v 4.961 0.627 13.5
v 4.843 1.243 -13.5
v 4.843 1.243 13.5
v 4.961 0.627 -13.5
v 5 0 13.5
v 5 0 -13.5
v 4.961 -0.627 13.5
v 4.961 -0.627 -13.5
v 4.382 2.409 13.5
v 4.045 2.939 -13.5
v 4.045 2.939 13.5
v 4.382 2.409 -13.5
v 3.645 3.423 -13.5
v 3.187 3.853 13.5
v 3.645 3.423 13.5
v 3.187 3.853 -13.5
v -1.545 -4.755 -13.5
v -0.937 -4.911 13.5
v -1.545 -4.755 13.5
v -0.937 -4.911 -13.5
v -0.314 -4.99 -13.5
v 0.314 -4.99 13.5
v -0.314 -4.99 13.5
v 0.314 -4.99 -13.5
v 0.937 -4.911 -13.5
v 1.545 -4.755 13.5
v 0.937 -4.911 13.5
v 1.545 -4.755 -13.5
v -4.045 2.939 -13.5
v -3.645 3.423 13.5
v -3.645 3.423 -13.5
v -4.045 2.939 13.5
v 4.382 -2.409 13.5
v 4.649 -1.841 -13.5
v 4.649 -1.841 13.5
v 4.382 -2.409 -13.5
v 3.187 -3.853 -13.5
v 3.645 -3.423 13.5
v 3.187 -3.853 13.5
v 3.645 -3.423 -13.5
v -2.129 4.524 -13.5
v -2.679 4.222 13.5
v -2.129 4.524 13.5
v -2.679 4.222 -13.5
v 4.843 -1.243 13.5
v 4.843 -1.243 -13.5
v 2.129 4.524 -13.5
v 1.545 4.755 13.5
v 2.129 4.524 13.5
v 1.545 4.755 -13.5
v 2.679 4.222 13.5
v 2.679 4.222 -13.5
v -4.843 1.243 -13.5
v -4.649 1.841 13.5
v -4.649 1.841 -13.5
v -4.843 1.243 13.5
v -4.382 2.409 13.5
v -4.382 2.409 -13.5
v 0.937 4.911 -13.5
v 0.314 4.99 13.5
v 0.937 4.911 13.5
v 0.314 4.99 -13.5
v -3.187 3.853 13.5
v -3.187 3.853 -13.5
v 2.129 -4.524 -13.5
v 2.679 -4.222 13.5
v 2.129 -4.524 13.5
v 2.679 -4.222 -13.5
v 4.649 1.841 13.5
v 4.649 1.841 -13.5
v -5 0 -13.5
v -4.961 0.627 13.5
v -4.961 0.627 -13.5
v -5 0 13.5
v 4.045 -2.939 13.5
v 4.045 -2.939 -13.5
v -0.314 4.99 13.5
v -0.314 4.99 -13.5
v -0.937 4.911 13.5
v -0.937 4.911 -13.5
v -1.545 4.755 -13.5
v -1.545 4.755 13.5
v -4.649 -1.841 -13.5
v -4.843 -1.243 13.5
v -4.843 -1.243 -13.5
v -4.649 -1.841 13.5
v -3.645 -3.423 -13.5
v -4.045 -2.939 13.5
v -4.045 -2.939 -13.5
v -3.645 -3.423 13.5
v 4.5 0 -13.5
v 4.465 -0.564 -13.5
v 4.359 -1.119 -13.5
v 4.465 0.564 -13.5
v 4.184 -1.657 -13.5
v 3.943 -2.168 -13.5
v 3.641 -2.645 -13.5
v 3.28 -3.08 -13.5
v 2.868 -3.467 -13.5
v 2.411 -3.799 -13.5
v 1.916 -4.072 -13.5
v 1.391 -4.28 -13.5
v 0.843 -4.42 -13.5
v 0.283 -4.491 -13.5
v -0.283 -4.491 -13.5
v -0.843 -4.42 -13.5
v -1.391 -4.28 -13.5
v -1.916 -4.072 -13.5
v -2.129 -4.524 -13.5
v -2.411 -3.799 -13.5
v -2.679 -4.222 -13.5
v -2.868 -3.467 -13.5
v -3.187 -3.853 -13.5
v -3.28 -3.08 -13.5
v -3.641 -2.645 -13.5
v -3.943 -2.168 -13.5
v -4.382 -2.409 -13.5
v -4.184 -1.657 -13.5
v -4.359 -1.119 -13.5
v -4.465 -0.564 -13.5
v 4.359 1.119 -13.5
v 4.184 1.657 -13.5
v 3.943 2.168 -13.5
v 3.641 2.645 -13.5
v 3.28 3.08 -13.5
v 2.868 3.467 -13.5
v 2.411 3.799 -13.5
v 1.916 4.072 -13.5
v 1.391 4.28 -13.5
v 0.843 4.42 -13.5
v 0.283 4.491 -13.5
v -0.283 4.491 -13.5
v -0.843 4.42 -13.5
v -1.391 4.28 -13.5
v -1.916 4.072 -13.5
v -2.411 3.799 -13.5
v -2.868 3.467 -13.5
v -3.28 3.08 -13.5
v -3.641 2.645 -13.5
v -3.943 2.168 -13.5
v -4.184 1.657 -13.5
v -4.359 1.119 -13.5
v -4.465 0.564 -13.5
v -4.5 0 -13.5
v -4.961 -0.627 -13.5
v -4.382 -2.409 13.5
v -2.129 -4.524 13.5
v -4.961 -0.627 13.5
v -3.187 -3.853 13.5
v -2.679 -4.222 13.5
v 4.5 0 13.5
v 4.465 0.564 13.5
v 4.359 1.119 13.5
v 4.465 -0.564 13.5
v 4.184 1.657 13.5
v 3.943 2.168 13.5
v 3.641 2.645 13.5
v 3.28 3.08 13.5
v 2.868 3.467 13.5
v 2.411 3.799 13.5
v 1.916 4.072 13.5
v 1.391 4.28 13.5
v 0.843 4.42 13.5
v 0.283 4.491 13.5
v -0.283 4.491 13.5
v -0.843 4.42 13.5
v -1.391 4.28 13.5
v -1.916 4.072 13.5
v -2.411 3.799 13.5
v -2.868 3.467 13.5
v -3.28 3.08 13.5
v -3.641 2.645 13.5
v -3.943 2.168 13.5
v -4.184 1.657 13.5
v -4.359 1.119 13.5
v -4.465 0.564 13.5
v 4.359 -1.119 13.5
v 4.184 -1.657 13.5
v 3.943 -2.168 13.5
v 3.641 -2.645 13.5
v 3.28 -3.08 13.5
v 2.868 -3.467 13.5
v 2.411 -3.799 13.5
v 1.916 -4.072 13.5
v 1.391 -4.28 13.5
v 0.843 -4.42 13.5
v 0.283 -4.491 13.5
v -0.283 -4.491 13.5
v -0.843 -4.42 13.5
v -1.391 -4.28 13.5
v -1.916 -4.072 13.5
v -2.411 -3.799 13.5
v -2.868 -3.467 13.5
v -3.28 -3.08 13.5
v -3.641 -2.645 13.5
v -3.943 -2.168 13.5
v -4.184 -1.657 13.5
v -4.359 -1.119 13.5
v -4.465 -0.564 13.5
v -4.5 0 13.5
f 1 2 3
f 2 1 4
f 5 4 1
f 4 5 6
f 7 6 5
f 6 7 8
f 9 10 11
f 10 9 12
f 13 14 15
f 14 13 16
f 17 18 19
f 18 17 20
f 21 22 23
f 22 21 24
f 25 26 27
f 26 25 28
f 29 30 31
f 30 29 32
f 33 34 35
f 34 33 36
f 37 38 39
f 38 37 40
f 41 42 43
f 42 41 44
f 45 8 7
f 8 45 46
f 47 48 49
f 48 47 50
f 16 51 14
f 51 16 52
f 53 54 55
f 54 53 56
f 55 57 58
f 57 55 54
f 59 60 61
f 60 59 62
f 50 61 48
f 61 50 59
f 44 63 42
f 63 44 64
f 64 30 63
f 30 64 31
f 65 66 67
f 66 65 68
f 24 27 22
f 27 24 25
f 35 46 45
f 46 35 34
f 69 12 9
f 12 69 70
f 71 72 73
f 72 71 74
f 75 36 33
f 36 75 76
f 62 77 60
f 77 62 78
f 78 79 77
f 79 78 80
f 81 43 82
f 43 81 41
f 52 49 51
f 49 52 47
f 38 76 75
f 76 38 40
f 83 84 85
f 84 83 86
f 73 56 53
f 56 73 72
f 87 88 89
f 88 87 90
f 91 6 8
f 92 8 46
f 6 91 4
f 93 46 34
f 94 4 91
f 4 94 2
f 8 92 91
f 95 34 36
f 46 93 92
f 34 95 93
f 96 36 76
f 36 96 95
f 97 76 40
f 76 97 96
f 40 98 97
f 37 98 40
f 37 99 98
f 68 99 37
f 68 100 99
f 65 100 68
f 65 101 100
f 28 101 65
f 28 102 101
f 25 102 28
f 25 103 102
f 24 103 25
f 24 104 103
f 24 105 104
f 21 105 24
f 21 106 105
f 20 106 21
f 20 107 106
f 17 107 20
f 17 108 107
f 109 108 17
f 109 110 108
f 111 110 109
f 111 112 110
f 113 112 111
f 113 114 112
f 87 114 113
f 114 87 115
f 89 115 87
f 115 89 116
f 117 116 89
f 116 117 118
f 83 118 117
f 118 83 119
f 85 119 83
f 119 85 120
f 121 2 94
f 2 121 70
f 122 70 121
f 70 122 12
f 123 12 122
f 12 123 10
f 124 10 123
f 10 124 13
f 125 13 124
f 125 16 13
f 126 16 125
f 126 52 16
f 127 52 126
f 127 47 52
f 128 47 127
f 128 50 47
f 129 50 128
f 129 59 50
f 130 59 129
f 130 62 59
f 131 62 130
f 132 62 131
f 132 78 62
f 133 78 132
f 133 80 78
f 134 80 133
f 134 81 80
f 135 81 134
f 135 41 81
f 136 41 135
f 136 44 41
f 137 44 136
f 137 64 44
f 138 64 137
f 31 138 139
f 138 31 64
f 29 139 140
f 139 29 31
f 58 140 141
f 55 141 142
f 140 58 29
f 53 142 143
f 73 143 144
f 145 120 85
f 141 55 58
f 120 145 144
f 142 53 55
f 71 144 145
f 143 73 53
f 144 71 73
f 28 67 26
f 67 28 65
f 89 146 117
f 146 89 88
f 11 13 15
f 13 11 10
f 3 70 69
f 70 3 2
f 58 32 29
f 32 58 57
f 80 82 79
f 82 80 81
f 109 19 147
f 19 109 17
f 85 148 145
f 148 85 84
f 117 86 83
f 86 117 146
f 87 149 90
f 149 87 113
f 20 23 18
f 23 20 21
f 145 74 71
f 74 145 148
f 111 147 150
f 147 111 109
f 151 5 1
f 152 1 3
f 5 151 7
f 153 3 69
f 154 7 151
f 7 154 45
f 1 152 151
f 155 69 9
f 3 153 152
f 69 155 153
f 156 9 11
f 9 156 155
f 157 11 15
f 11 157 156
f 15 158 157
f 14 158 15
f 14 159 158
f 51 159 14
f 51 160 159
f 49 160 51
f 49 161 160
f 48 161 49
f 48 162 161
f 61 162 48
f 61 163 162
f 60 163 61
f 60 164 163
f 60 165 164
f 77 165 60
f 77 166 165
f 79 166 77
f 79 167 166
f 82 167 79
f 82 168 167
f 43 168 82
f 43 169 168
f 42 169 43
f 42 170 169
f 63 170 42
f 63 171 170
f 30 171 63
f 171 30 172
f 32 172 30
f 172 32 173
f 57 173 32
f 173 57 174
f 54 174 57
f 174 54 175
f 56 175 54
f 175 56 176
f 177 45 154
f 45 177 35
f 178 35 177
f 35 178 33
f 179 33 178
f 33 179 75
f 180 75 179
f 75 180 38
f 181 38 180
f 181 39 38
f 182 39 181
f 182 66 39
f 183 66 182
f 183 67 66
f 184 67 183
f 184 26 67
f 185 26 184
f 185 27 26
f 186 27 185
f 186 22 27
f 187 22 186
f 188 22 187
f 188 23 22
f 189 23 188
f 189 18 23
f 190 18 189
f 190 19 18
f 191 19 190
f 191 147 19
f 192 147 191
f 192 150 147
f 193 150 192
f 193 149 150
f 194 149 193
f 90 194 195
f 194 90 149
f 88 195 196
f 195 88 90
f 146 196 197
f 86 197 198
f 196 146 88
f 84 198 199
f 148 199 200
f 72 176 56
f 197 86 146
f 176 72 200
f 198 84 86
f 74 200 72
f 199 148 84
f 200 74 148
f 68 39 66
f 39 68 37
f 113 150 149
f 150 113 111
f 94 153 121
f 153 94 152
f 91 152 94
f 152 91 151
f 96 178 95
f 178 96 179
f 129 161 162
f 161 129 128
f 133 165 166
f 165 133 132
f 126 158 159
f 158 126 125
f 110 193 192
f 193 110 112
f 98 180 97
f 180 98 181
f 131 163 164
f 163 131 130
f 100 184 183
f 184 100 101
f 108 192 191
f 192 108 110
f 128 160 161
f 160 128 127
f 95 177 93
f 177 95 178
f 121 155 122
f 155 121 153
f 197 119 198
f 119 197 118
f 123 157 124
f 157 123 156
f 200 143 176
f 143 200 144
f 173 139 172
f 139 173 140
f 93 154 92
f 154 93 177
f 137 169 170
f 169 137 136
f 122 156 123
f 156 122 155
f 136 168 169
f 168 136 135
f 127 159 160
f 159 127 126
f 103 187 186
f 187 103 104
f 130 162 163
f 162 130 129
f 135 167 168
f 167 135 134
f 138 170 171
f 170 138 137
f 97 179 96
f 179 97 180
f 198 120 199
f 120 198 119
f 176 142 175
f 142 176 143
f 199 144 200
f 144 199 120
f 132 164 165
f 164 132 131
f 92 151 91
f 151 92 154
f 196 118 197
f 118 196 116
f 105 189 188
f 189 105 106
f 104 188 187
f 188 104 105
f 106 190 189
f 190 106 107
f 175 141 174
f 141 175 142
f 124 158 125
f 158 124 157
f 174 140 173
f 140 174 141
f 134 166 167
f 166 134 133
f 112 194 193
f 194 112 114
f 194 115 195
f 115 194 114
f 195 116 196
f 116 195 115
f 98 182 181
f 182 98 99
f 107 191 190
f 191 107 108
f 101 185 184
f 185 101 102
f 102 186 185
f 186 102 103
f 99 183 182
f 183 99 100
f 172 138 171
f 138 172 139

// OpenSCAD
$fn = 50;


difference() {
	union() {
		translate(v = [0, 0, -13.5000000000]) {
			cylinder(h = 27, r = 5.0000000000);
		}
	}
	union() {
		translate(v = [0, 0, -100.0000000000]) {
			cylinder(h = 200, r = 4.5000000000);
		}
	}
}
